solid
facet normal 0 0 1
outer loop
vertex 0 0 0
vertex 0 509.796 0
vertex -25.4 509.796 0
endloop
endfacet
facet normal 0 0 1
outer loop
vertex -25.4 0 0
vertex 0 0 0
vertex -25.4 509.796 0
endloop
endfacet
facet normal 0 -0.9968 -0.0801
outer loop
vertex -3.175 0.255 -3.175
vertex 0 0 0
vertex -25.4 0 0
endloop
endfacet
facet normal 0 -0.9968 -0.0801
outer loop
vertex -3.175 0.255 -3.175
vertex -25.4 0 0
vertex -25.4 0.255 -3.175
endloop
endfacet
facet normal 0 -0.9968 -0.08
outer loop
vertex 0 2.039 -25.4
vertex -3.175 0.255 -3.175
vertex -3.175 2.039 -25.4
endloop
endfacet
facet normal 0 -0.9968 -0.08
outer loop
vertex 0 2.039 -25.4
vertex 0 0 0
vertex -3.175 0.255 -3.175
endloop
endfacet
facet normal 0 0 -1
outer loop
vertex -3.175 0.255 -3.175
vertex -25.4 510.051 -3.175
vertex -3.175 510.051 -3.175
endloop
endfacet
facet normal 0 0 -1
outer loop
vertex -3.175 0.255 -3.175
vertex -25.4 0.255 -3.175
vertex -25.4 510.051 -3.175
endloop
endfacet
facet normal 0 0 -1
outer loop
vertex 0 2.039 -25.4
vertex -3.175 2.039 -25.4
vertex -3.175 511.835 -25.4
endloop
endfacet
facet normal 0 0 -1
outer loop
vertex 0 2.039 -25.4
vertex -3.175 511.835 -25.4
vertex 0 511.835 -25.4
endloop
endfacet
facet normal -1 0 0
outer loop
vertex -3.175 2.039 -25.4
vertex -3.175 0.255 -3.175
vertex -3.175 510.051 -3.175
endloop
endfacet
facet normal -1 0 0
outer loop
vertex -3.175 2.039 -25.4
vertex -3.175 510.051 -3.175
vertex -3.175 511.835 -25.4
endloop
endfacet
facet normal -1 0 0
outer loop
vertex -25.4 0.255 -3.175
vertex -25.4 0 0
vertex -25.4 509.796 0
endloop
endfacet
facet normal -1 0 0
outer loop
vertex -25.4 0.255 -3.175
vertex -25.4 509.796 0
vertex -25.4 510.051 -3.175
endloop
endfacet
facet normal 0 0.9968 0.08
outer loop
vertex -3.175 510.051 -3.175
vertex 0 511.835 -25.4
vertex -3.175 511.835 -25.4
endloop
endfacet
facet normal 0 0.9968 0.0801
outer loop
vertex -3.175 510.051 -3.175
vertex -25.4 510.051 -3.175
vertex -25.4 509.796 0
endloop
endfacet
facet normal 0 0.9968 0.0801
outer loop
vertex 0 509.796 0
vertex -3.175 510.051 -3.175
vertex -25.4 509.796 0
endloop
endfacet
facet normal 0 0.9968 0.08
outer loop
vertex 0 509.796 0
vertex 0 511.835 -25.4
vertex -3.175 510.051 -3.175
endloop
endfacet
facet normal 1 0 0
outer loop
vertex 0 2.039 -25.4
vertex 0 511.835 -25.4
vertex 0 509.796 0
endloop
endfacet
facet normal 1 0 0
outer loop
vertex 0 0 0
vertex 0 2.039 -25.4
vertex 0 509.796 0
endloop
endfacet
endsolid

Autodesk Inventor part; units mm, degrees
ref_plane "YZ Plane" through (0, 0, 0) normal (1, 0, 0) x (0, 1, 0)
ref_plane "XZ Plane" through (0, 0, 0) normal (0, 1, 0) x (-1, 0, 0)
ref_plane "XY Plane" through (0, 0, 0) normal (0, 0, 1) x (1, 0, 0)
sketch "Sketch1" plane through (0, 0, 0) normal (0, 1, 0) x (-1, 0, 0)
  line L0 (0, 0) -> (25.4, 0)
  line L1 (25.4, 0) -> (25.4, -3.175)
  line L2 (25.4, -3.175) -> (3.175, -3.175)
  line L3 (3.175, -3.175) -> (3.175, -25.4)
  line L4 (3.175, -25.4) -> (0, -25.4)
  line L5 (0, -25.4) -> (0, 0)
  dimension "d0" = 25.4
  dimension "d1" = 3.175
  dimension "d2" = 90
  dimension "d7" = 25.4
  dimension "d8" = 3.175
extrude "Extrusion1" add sketch "Sketch1" along normal blind 511.8354
sketch "Sketch2" plane through (0, 0, 0) normal (1, 0, 0) x (0, 0, -1)
  line L0 (25.4, 0) -> (25.4, 511.8354) projected
  line L1 (25.4, 511.8354) -> (50.8817, 511.8354) construction
  line L2 (0, 511.8354) -> (25.4, 511.8354) projected
  line L3 (25.4, 511.8354) -> (0, 509.7962)
  line L4 (0, 0) -> (0, 511.8354) projected
  line L5 (25.4, 511.8354) -> (50.8817, 511.8354) construction
  line L6 (0, 509.7962) -> (0, 511.8354)
  line L7 (25.4, 511.8354) -> (0, 511.8354)
  line L8 (25.4, 0) -> (0, 0) projected
  line L9 (0, 0) -> (25.4, 2.0392)
  line L10 (0, 0) -> (25.4817, 0) construction
  line L11 (25.4, 2.0392) -> (25.4, 0)
  line L12 (25.4, 0) -> (0, 0)
  dimension "d10" = 175.41
  dimension "d11" = 4.59
extrude "Extrusion2" cut sketch "Sketch2" against normal through all contours L8 L9 L0 | L3 L4 L2
properties part number "AngleL" material "Aluminum 6061"
